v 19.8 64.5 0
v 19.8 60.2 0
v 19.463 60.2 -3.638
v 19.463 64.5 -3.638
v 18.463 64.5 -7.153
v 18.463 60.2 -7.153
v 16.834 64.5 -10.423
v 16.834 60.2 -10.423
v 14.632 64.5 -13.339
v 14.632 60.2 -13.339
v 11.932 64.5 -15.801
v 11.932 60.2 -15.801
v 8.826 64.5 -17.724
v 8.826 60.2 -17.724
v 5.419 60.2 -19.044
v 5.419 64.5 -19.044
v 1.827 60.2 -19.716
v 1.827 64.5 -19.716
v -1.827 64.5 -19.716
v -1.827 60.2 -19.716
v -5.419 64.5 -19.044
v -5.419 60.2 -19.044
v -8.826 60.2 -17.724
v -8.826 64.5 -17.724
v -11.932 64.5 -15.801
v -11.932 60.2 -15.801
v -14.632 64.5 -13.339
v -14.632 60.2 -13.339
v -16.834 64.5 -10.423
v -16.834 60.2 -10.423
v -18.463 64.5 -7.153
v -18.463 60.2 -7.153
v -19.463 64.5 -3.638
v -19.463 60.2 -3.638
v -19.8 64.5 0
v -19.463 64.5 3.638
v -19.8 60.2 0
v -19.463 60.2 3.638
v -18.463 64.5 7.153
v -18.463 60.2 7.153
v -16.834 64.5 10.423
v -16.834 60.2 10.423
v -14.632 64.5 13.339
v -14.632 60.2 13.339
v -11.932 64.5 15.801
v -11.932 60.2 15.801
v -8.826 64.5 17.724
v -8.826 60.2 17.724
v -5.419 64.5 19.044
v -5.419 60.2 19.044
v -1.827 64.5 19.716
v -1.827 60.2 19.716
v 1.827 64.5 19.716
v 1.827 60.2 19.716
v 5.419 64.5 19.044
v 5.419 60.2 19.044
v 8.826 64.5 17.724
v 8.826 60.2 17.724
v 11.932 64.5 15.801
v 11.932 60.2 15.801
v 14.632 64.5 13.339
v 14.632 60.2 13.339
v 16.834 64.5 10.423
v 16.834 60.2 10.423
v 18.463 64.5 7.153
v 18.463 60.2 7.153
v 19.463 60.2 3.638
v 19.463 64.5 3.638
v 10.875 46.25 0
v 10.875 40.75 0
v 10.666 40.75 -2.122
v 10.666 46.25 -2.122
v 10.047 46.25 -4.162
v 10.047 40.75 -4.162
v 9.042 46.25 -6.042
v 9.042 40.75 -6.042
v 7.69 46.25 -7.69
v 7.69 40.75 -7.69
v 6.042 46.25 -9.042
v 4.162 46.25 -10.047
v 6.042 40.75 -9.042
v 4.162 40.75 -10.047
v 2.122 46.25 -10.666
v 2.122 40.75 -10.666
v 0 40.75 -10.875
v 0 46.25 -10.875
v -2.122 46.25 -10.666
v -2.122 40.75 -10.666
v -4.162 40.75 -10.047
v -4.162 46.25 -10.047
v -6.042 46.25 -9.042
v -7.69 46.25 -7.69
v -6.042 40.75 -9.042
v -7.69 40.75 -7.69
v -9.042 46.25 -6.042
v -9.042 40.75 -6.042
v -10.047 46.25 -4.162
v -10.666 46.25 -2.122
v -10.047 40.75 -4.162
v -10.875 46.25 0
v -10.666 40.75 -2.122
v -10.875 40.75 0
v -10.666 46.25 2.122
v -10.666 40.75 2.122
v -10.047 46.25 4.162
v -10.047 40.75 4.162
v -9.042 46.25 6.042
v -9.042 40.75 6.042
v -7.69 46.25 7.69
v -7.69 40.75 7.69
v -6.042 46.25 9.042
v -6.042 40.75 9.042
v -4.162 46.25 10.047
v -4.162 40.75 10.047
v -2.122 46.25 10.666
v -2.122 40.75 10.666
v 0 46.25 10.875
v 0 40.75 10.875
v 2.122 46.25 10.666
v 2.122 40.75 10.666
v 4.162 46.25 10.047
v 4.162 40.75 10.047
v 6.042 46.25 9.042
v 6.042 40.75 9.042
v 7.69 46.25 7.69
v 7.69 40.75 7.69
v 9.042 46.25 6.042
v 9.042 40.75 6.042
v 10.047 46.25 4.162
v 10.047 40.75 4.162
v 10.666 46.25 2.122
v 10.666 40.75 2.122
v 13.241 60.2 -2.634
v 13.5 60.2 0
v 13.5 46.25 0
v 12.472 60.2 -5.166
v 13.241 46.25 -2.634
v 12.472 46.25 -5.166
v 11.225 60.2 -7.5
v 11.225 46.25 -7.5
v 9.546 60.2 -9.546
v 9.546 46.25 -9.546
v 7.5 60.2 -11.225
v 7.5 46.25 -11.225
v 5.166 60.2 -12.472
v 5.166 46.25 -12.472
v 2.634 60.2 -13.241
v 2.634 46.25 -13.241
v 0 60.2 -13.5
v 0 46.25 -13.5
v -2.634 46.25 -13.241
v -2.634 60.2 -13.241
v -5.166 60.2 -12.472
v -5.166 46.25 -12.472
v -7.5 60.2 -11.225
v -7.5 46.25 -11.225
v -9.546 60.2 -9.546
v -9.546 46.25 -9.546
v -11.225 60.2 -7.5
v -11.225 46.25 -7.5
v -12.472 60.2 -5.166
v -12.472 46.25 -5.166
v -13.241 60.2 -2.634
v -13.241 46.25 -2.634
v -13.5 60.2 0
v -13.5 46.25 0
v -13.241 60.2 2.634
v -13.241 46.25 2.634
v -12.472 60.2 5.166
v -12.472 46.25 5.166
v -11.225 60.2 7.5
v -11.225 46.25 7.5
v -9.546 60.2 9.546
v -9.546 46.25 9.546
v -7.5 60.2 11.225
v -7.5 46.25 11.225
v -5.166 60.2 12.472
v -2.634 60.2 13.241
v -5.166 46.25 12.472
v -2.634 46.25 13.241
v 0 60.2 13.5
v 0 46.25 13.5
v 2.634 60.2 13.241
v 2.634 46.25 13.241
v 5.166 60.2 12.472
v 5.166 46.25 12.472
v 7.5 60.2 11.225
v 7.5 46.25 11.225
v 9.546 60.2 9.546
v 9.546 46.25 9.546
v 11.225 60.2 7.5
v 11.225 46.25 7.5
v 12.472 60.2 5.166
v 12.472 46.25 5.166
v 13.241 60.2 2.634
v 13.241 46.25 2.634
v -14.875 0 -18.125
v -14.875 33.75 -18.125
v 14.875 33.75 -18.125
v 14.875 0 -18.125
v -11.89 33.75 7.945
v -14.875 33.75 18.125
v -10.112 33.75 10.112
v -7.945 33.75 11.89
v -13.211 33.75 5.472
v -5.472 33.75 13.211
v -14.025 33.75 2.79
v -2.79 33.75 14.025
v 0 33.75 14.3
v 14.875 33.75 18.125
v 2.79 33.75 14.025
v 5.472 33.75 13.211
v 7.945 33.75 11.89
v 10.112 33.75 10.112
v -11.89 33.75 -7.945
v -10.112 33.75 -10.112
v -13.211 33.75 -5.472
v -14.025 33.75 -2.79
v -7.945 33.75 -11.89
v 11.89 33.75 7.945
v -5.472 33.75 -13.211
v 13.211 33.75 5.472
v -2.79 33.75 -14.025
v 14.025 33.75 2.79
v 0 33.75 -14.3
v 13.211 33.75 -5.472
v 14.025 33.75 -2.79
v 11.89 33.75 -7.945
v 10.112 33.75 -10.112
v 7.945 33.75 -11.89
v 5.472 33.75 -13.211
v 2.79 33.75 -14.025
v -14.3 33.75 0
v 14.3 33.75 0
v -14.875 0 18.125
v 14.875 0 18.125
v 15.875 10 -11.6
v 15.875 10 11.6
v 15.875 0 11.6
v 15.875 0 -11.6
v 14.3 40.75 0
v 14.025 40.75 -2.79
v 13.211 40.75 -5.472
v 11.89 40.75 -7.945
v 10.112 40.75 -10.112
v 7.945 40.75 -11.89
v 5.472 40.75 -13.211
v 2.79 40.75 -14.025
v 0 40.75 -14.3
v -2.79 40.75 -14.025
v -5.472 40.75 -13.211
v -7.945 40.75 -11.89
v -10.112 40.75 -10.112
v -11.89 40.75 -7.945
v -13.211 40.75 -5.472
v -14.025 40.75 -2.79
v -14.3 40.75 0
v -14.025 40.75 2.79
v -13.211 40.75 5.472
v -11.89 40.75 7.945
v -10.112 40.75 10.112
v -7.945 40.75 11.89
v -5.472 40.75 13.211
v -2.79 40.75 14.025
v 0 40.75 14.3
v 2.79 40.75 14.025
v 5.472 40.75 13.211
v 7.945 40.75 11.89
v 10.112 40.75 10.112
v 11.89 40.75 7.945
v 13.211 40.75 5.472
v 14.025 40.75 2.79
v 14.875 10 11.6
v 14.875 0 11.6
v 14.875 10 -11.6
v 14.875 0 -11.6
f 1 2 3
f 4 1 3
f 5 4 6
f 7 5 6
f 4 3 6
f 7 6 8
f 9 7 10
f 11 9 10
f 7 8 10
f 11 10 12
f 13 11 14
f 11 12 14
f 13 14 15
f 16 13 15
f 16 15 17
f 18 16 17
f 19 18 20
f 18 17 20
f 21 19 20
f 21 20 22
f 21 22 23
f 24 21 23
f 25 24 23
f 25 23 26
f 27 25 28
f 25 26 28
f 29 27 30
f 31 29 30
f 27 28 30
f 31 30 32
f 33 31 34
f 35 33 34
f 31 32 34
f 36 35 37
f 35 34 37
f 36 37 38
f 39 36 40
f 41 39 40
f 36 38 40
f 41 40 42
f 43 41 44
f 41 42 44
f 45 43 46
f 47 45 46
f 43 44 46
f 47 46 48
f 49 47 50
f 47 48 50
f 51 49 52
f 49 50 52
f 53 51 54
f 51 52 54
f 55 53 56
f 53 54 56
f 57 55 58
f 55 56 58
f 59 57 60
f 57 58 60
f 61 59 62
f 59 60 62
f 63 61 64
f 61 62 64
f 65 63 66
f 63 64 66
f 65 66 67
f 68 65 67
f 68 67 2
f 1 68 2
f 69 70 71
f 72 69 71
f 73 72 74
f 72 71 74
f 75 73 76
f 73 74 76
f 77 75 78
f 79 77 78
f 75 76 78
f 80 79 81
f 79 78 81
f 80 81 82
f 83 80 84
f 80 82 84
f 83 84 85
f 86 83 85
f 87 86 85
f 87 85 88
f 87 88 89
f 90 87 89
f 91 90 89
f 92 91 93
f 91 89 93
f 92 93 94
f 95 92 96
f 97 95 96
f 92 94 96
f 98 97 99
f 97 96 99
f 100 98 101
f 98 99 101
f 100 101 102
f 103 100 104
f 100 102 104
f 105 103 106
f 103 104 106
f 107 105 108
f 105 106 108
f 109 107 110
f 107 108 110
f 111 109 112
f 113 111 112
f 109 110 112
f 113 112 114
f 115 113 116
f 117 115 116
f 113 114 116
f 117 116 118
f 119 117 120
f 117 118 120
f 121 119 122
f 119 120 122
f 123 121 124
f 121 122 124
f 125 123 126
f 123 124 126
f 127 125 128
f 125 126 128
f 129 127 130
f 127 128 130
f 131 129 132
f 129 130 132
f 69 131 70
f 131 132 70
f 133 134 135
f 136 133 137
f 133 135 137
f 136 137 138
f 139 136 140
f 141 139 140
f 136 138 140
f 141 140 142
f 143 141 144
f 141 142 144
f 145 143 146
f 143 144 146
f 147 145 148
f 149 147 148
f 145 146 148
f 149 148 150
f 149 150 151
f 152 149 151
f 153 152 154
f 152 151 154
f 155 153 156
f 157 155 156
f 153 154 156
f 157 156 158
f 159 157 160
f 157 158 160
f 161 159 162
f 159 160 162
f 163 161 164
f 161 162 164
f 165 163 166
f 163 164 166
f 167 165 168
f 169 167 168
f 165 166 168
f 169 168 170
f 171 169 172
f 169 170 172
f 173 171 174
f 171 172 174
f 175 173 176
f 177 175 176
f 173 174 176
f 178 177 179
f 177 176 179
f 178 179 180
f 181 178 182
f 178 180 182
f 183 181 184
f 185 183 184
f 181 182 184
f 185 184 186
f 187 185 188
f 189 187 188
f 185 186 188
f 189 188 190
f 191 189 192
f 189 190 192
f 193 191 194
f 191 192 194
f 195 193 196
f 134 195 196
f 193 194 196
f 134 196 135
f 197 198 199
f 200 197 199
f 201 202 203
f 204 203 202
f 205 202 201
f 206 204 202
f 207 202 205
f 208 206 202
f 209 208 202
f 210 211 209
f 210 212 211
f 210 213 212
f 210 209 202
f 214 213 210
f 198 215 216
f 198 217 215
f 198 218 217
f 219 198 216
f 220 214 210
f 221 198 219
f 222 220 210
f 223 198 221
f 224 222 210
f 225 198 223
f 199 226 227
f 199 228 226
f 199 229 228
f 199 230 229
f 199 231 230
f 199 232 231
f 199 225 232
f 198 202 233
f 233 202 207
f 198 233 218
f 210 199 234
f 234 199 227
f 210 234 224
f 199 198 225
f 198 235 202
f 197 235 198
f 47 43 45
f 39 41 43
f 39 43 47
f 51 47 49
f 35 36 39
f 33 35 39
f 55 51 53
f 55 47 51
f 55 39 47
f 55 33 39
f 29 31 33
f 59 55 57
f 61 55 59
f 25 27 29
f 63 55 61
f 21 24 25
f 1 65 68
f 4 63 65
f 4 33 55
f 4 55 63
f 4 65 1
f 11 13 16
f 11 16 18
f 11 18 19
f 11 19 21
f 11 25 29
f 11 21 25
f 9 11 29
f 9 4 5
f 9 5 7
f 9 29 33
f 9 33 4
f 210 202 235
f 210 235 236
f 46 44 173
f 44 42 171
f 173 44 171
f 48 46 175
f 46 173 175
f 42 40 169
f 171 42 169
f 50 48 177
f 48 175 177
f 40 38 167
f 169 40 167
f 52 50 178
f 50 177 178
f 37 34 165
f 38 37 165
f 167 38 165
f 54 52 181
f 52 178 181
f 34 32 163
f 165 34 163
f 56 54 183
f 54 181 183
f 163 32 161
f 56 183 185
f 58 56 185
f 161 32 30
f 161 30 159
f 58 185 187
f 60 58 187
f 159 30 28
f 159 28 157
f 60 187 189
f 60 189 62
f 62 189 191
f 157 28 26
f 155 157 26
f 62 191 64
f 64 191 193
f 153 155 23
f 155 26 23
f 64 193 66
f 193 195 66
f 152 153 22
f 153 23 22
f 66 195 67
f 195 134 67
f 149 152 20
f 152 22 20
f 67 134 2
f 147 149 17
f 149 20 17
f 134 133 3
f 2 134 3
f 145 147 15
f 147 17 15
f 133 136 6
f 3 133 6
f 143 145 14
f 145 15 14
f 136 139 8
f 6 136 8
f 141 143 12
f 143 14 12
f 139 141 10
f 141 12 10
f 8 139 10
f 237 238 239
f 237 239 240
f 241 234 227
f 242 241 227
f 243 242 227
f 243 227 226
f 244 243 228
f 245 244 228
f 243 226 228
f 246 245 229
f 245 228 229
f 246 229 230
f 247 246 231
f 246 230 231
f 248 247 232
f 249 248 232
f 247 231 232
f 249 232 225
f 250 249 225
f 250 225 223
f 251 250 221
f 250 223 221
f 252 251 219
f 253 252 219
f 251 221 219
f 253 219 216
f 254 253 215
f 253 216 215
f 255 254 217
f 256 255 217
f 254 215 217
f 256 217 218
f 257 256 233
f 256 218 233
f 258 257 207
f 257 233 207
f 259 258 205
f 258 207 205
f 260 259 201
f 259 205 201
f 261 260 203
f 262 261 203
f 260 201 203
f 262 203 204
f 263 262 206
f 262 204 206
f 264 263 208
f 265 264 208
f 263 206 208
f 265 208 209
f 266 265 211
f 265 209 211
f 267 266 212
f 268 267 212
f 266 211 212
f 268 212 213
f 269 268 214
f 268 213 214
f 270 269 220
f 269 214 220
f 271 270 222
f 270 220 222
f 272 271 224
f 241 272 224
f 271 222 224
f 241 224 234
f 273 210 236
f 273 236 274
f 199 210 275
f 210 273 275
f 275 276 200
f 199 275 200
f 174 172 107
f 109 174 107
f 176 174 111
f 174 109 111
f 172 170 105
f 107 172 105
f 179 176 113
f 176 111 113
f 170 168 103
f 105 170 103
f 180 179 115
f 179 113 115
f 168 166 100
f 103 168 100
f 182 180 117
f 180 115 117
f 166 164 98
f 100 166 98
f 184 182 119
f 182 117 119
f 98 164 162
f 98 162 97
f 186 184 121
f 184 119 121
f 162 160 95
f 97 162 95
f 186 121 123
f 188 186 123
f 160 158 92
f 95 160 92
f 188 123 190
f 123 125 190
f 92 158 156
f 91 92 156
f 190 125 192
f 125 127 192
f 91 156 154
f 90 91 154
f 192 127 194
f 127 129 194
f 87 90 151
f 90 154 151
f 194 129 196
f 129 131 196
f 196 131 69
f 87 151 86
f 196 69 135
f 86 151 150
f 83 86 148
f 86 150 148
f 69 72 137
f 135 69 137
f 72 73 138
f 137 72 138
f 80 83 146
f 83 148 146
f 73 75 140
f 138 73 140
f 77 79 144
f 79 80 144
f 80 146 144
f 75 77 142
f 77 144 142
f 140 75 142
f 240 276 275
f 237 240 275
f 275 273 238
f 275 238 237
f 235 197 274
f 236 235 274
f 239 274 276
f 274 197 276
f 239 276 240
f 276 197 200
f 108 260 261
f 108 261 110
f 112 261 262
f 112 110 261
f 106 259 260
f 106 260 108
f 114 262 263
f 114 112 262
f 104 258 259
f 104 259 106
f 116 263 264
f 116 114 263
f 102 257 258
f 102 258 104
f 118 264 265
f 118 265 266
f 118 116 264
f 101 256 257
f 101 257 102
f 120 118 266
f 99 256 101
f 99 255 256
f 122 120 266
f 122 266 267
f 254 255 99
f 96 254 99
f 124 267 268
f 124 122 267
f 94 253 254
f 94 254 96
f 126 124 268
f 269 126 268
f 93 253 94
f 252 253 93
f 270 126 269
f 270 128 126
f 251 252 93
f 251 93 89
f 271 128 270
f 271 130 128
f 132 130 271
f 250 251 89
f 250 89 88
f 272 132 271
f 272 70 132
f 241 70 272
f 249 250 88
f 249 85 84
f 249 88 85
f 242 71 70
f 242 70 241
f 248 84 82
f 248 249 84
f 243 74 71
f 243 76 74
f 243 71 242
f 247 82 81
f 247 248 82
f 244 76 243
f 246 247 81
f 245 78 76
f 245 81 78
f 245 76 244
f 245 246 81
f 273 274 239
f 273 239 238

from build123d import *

# Parameters (mm, degrees)
SKETCH2_W           = 29.75
SKETCH2_H           = 36.25
BOSS_EXTRUDE1_DEPTH = 33.75
SKETCH3_R           = 14.3
BOSS_EXTRUDE2_DEPTH = 7
SKETCH4_R           = 10.875
BOSS_EXTRUDE3_DEPTH = 5.5
SKETCH5_R           = 13.5
BOSS_EXTRUDE4_DEPTH = 13.95
SKETCH6_R           = 19.8
BOSS_EXTRUDE5_DEPTH = 4.3
SKETCH7_W           = 23.2
SKETCH7_H           = 10
BOSS_EXTRUDE6_DEPTH = 1


with BuildPart() as part:
    # Sketch2 → Boss-Extrude1 (new body)
    with BuildSketch(Plane(origin=(0, 0, 0), x_dir=(1, 0, 0), z_dir=(0, 1, 0))):
        Rectangle(SKETCH2_W, SKETCH2_H)
    extrude(amount=BOSS_EXTRUDE1_DEPTH)

    # Sketch3 → Boss-Extrude2 (add)
    with BuildSketch(Plane(origin=(0, 33.75, 0), x_dir=(1, 0, 0), z_dir=(0, 1, 0))):
        Circle(SKETCH3_R)
    extrude(amount=BOSS_EXTRUDE2_DEPTH)

    # Sketch4 → Boss-Extrude3 (add)
    with BuildSketch(Plane(origin=(0, 40.75, 0), x_dir=(1, 0, 0), z_dir=(0, 1, 0))):
        Circle(SKETCH4_R)
    extrude(amount=BOSS_EXTRUDE3_DEPTH)

    # Sketch5 → Boss-Extrude4 (add)
    with BuildSketch(Plane(origin=(0, 46.25, 0), x_dir=(1, 0, 0), z_dir=(0, 1, 0))):
        Circle(SKETCH5_R)
    extrude(amount=BOSS_EXTRUDE4_DEPTH)

    # Sketch6 → Boss-Extrude5 (add)
    with BuildSketch(Plane(origin=(0, 60.2, 0), x_dir=(1, 0, 0), z_dir=(0, 1, 0))):
        Circle(SKETCH6_R)
    extrude(amount=BOSS_EXTRUDE5_DEPTH)

    # Sketch7 → Boss-Extrude6 (add)
    with BuildSketch(Plane(origin=(14.875, 0, 0), x_dir=(0, 0, -1), z_dir=(1, 0, 0))):
        with Locations((0, 5)):
            Rectangle(SKETCH7_W, SKETCH7_H)
    extrude(amount=BOSS_EXTRUDE6_DEPTH)


solid = part.part
